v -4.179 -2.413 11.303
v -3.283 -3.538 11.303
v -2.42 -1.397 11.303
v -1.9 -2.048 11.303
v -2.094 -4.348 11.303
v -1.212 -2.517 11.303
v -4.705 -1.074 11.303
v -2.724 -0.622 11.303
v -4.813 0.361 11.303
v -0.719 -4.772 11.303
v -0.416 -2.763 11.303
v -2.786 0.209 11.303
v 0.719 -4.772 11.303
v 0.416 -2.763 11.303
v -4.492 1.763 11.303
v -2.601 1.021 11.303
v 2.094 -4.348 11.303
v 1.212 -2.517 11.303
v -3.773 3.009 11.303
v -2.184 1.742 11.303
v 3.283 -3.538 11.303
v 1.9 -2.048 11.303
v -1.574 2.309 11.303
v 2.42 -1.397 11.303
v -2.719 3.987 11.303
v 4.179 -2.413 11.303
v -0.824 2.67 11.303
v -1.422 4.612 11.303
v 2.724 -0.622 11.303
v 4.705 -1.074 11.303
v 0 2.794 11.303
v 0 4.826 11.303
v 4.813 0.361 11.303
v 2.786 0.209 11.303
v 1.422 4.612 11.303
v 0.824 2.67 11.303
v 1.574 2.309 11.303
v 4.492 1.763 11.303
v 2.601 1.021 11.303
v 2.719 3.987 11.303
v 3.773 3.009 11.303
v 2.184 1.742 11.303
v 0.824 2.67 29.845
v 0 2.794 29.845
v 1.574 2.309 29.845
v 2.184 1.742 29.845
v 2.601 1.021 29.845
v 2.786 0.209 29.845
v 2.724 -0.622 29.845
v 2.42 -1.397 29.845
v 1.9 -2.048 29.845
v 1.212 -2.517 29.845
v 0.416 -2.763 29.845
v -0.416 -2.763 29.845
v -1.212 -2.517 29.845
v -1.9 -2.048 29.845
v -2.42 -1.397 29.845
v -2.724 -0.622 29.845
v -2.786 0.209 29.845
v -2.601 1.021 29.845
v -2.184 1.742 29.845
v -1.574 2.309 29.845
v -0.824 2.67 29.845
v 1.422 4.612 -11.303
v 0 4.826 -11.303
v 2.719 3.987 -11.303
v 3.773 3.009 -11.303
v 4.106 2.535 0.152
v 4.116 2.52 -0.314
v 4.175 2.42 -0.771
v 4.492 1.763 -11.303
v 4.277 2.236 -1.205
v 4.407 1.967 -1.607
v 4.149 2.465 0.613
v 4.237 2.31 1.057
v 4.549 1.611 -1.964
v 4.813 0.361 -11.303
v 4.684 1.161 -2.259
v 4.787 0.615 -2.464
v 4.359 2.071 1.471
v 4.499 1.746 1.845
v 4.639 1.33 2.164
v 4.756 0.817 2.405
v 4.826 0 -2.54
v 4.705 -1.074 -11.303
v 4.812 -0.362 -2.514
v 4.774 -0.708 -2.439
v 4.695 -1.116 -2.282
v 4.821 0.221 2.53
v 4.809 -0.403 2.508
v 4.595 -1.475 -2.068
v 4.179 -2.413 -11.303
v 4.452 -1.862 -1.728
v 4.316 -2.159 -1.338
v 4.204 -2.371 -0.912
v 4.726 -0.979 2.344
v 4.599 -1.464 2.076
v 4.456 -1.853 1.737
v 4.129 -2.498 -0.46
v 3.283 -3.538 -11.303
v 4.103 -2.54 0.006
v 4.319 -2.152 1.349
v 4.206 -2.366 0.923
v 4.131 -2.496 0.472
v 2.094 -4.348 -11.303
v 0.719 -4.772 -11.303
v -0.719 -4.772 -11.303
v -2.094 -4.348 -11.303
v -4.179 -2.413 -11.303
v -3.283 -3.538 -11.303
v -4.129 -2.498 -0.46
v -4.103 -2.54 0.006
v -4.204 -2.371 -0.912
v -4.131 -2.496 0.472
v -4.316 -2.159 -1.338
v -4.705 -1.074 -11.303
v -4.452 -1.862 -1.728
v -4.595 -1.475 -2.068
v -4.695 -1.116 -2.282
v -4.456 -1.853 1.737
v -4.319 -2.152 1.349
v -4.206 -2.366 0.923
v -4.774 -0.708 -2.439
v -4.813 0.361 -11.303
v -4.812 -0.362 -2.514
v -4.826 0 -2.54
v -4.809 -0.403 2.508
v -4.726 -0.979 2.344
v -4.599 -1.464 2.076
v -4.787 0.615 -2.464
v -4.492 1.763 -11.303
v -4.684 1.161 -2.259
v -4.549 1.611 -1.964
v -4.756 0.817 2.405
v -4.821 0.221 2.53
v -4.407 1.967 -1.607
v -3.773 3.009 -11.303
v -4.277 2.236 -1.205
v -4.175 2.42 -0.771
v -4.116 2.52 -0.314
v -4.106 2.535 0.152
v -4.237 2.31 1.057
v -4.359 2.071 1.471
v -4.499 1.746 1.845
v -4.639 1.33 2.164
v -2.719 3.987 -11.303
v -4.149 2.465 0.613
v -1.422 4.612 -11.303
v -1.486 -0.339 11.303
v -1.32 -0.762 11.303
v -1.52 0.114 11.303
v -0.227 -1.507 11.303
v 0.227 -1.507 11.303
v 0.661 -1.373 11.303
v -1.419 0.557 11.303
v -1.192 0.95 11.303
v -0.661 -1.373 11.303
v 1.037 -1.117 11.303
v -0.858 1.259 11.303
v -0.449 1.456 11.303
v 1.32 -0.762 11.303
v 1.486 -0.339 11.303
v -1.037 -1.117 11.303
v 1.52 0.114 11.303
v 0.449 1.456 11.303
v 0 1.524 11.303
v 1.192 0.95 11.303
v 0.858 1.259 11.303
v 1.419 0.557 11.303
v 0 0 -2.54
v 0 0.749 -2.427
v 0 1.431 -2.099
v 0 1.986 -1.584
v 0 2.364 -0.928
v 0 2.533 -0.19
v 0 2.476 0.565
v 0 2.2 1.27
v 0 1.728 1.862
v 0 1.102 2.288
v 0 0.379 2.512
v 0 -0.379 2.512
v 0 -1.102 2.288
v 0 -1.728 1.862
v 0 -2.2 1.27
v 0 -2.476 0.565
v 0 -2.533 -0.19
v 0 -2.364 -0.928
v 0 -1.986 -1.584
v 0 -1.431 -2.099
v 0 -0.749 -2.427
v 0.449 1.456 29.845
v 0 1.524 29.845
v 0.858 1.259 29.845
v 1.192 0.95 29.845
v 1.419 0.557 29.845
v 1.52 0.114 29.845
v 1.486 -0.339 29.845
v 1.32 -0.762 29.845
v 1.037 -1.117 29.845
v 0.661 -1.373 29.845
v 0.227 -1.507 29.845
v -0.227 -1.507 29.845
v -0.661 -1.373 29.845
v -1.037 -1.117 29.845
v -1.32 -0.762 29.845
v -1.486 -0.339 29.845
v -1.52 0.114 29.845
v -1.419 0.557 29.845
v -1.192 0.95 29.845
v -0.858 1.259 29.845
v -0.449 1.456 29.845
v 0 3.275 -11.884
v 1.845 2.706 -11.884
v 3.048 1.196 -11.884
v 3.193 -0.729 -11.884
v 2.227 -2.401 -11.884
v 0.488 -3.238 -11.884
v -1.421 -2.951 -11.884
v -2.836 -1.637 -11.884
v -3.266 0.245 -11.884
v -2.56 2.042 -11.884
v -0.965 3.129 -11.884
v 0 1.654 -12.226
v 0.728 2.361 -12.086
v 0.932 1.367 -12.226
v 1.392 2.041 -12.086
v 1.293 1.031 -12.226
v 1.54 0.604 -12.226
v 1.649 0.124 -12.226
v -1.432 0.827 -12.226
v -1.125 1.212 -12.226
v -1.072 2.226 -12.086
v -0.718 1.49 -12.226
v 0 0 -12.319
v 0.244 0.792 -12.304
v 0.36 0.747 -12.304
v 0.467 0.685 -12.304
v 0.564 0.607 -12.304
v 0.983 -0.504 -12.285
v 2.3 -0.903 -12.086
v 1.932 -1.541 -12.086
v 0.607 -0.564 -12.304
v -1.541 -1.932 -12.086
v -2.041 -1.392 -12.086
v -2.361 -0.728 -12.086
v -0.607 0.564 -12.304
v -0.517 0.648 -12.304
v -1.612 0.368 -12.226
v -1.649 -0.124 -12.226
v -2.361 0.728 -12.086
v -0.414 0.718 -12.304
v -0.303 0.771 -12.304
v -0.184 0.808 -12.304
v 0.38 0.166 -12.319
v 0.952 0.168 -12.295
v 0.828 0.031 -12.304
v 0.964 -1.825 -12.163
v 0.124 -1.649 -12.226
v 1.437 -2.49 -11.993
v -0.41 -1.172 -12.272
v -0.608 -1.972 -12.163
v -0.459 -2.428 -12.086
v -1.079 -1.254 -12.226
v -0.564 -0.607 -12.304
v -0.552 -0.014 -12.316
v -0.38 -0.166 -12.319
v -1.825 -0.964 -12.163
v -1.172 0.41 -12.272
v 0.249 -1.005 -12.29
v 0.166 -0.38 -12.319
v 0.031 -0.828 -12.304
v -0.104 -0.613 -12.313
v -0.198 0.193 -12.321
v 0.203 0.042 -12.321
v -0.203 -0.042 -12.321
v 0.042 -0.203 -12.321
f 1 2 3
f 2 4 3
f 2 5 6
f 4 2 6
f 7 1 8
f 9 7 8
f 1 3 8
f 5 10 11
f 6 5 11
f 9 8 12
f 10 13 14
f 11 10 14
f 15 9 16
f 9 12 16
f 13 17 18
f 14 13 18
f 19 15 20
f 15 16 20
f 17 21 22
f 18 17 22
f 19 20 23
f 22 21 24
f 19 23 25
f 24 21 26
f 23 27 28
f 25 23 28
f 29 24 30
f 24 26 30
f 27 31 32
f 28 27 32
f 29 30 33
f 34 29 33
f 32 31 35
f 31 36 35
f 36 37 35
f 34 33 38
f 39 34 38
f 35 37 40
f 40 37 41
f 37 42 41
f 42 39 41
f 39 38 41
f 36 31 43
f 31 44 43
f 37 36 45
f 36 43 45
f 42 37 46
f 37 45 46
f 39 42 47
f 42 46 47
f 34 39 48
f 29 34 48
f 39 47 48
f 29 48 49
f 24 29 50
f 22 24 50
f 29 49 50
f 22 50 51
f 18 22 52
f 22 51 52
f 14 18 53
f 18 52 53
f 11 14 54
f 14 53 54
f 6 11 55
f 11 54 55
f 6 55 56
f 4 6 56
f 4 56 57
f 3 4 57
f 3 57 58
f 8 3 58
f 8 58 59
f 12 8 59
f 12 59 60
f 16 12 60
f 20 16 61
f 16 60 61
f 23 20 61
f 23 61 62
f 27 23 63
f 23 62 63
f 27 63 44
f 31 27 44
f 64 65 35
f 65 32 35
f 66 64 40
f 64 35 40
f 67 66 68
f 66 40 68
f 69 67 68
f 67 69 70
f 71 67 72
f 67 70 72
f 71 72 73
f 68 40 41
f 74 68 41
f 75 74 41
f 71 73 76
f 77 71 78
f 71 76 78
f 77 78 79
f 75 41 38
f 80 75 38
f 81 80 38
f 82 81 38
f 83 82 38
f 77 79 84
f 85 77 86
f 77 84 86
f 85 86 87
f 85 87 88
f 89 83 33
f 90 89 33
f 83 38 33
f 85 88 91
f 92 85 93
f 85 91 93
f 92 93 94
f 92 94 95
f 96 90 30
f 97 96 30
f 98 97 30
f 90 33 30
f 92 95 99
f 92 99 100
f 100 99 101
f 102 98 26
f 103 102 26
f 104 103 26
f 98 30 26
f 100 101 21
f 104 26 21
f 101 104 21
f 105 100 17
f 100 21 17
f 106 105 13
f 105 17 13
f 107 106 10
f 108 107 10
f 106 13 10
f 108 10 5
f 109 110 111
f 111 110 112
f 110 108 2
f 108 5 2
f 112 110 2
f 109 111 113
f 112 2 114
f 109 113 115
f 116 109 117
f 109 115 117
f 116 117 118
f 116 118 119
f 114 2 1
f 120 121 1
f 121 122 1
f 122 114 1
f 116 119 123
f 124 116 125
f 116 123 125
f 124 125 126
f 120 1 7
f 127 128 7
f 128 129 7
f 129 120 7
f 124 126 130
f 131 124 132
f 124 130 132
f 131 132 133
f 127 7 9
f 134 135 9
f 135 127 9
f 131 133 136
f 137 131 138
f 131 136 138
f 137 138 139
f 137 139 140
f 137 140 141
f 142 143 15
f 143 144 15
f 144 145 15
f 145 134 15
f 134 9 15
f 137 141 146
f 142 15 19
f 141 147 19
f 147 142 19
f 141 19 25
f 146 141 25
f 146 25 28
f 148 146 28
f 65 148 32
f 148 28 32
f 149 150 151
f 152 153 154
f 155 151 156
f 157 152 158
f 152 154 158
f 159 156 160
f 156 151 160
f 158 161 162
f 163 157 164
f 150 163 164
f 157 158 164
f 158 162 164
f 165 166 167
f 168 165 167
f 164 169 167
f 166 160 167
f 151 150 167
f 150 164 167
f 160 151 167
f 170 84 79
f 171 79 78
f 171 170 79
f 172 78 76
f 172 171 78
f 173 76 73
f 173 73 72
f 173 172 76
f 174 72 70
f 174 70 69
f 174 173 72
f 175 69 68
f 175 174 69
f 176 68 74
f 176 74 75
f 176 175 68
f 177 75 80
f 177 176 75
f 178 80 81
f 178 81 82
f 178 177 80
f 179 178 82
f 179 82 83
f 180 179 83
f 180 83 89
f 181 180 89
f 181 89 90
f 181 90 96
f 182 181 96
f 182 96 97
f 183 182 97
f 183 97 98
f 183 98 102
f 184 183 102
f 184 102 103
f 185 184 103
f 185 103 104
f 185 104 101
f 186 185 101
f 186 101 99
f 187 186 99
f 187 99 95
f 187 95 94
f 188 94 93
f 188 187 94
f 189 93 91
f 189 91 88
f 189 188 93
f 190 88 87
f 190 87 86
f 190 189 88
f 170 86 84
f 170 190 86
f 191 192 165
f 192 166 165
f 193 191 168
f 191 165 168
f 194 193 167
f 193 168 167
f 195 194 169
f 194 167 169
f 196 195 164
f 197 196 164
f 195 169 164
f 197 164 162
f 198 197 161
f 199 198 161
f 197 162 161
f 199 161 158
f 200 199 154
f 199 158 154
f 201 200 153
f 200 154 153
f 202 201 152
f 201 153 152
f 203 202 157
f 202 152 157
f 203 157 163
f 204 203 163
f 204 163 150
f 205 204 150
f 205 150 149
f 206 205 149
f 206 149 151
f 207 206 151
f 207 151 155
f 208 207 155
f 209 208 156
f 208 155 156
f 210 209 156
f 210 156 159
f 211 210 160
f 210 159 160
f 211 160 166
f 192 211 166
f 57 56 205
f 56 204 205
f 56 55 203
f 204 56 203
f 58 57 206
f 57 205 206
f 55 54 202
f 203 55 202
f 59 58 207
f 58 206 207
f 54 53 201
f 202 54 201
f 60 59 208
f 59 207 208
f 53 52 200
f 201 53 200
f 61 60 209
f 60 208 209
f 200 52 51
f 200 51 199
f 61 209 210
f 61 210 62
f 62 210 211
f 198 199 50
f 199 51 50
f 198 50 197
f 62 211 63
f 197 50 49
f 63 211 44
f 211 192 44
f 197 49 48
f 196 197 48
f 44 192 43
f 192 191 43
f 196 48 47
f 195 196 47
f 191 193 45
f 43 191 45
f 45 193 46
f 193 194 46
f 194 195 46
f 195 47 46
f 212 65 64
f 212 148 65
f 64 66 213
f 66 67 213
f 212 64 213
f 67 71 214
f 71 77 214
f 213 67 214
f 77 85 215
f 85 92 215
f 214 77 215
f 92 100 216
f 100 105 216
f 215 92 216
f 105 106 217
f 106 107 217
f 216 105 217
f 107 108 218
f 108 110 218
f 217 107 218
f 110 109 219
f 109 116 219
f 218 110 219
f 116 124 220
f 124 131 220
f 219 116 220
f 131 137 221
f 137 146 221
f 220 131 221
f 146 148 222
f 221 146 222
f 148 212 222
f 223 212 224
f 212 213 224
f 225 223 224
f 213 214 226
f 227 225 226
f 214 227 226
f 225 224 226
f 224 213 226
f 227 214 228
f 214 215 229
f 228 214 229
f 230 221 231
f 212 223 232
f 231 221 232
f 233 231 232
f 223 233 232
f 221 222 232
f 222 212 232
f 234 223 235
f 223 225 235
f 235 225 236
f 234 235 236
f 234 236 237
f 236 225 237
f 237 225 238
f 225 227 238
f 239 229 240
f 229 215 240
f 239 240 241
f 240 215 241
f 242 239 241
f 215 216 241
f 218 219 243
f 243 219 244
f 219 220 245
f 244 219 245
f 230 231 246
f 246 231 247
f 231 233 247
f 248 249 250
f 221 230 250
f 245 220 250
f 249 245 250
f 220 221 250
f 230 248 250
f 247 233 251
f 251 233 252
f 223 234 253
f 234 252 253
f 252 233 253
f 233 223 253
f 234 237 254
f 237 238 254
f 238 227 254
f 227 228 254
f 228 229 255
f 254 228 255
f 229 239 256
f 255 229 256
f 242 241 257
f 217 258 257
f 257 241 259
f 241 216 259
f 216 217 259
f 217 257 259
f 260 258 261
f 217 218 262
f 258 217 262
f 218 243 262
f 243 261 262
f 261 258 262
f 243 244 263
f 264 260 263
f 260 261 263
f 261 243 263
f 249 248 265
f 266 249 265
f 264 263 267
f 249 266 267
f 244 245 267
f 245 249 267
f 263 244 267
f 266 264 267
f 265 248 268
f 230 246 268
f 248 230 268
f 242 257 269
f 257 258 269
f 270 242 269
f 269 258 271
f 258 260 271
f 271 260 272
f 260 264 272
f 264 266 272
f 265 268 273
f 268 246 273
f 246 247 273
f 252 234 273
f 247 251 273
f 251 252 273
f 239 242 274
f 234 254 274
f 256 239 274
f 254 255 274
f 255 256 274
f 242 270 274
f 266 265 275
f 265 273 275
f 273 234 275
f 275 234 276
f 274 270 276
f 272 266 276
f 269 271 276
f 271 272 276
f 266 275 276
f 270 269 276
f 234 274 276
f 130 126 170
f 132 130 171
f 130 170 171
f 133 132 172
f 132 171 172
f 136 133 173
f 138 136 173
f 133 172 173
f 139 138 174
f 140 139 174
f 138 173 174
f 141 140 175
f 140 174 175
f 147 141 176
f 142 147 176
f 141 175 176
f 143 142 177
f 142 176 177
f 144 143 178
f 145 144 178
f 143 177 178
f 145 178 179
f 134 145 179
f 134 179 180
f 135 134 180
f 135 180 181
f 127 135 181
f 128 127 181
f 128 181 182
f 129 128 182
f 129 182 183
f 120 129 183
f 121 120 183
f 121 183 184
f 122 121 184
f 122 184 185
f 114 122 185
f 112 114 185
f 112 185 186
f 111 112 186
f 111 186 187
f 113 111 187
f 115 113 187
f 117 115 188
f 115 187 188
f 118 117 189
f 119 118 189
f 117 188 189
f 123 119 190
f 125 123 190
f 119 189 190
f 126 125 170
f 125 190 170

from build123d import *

# Parameters (mm, degrees)
SKETCH2_R               = 2.54
CUT_EXTRUDE2_DEPTH      = 5.8260001
CUT_EXTRUDE2_DEPTH_BACK = 5.8260001


with BuildPart() as part:
    # Sketch1 → Revolve1 (revolve)
    with BuildSketch(Plane(origin=(0, 0, 0), x_dir=(0, 0, -1), z_dir=(1, 0, 0))):
        with BuildLine():
            Line((2.54, 0), (11.303, 0))
            Line((11.303, 0), (12.319, 0))
            ThreePointArc((12.319, 0), (12.085657597, 2.470822652), (11.303, 4.826))
            Line((11.303, 4.826), (-11.303, 4.826))
            Line((-11.303, 4.826), (-11.303, 2.794))
            Line((-11.303, 2.794), (-29.845, 2.794))
            Line((-29.845, 2.794), (-29.845, 1.524))
            Line((-29.845, 1.524), (-11.303, 1.524))
            Line((-11.303, 1.524), (-11.303, 0))
            Line((-11.303, 0), (-2.54, 0))
            ThreePointArc((-2.54, 0), (0, 2.54), (2.54, 0))
        make_face()
    revolve(axis=Axis((0, 0, 36.613472311), (0, 0, -1)))

    # Sketch2 → Cut-Extrude2 (cut, two sides)
    with BuildSketch(Plane(origin=(0, 0, 0), x_dir=(0, 0, -1), z_dir=(1, 0, 0))) as cut_extrude2_sk:
        Circle(SKETCH2_R)
    extrude(amount=CUT_EXTRUDE2_DEPTH, mode=Mode.SUBTRACT)
    extrude(cut_extrude2_sk.sketch, amount=-CUT_EXTRUDE2_DEPTH_BACK, mode=Mode.SUBTRACT)


solid = part.part
